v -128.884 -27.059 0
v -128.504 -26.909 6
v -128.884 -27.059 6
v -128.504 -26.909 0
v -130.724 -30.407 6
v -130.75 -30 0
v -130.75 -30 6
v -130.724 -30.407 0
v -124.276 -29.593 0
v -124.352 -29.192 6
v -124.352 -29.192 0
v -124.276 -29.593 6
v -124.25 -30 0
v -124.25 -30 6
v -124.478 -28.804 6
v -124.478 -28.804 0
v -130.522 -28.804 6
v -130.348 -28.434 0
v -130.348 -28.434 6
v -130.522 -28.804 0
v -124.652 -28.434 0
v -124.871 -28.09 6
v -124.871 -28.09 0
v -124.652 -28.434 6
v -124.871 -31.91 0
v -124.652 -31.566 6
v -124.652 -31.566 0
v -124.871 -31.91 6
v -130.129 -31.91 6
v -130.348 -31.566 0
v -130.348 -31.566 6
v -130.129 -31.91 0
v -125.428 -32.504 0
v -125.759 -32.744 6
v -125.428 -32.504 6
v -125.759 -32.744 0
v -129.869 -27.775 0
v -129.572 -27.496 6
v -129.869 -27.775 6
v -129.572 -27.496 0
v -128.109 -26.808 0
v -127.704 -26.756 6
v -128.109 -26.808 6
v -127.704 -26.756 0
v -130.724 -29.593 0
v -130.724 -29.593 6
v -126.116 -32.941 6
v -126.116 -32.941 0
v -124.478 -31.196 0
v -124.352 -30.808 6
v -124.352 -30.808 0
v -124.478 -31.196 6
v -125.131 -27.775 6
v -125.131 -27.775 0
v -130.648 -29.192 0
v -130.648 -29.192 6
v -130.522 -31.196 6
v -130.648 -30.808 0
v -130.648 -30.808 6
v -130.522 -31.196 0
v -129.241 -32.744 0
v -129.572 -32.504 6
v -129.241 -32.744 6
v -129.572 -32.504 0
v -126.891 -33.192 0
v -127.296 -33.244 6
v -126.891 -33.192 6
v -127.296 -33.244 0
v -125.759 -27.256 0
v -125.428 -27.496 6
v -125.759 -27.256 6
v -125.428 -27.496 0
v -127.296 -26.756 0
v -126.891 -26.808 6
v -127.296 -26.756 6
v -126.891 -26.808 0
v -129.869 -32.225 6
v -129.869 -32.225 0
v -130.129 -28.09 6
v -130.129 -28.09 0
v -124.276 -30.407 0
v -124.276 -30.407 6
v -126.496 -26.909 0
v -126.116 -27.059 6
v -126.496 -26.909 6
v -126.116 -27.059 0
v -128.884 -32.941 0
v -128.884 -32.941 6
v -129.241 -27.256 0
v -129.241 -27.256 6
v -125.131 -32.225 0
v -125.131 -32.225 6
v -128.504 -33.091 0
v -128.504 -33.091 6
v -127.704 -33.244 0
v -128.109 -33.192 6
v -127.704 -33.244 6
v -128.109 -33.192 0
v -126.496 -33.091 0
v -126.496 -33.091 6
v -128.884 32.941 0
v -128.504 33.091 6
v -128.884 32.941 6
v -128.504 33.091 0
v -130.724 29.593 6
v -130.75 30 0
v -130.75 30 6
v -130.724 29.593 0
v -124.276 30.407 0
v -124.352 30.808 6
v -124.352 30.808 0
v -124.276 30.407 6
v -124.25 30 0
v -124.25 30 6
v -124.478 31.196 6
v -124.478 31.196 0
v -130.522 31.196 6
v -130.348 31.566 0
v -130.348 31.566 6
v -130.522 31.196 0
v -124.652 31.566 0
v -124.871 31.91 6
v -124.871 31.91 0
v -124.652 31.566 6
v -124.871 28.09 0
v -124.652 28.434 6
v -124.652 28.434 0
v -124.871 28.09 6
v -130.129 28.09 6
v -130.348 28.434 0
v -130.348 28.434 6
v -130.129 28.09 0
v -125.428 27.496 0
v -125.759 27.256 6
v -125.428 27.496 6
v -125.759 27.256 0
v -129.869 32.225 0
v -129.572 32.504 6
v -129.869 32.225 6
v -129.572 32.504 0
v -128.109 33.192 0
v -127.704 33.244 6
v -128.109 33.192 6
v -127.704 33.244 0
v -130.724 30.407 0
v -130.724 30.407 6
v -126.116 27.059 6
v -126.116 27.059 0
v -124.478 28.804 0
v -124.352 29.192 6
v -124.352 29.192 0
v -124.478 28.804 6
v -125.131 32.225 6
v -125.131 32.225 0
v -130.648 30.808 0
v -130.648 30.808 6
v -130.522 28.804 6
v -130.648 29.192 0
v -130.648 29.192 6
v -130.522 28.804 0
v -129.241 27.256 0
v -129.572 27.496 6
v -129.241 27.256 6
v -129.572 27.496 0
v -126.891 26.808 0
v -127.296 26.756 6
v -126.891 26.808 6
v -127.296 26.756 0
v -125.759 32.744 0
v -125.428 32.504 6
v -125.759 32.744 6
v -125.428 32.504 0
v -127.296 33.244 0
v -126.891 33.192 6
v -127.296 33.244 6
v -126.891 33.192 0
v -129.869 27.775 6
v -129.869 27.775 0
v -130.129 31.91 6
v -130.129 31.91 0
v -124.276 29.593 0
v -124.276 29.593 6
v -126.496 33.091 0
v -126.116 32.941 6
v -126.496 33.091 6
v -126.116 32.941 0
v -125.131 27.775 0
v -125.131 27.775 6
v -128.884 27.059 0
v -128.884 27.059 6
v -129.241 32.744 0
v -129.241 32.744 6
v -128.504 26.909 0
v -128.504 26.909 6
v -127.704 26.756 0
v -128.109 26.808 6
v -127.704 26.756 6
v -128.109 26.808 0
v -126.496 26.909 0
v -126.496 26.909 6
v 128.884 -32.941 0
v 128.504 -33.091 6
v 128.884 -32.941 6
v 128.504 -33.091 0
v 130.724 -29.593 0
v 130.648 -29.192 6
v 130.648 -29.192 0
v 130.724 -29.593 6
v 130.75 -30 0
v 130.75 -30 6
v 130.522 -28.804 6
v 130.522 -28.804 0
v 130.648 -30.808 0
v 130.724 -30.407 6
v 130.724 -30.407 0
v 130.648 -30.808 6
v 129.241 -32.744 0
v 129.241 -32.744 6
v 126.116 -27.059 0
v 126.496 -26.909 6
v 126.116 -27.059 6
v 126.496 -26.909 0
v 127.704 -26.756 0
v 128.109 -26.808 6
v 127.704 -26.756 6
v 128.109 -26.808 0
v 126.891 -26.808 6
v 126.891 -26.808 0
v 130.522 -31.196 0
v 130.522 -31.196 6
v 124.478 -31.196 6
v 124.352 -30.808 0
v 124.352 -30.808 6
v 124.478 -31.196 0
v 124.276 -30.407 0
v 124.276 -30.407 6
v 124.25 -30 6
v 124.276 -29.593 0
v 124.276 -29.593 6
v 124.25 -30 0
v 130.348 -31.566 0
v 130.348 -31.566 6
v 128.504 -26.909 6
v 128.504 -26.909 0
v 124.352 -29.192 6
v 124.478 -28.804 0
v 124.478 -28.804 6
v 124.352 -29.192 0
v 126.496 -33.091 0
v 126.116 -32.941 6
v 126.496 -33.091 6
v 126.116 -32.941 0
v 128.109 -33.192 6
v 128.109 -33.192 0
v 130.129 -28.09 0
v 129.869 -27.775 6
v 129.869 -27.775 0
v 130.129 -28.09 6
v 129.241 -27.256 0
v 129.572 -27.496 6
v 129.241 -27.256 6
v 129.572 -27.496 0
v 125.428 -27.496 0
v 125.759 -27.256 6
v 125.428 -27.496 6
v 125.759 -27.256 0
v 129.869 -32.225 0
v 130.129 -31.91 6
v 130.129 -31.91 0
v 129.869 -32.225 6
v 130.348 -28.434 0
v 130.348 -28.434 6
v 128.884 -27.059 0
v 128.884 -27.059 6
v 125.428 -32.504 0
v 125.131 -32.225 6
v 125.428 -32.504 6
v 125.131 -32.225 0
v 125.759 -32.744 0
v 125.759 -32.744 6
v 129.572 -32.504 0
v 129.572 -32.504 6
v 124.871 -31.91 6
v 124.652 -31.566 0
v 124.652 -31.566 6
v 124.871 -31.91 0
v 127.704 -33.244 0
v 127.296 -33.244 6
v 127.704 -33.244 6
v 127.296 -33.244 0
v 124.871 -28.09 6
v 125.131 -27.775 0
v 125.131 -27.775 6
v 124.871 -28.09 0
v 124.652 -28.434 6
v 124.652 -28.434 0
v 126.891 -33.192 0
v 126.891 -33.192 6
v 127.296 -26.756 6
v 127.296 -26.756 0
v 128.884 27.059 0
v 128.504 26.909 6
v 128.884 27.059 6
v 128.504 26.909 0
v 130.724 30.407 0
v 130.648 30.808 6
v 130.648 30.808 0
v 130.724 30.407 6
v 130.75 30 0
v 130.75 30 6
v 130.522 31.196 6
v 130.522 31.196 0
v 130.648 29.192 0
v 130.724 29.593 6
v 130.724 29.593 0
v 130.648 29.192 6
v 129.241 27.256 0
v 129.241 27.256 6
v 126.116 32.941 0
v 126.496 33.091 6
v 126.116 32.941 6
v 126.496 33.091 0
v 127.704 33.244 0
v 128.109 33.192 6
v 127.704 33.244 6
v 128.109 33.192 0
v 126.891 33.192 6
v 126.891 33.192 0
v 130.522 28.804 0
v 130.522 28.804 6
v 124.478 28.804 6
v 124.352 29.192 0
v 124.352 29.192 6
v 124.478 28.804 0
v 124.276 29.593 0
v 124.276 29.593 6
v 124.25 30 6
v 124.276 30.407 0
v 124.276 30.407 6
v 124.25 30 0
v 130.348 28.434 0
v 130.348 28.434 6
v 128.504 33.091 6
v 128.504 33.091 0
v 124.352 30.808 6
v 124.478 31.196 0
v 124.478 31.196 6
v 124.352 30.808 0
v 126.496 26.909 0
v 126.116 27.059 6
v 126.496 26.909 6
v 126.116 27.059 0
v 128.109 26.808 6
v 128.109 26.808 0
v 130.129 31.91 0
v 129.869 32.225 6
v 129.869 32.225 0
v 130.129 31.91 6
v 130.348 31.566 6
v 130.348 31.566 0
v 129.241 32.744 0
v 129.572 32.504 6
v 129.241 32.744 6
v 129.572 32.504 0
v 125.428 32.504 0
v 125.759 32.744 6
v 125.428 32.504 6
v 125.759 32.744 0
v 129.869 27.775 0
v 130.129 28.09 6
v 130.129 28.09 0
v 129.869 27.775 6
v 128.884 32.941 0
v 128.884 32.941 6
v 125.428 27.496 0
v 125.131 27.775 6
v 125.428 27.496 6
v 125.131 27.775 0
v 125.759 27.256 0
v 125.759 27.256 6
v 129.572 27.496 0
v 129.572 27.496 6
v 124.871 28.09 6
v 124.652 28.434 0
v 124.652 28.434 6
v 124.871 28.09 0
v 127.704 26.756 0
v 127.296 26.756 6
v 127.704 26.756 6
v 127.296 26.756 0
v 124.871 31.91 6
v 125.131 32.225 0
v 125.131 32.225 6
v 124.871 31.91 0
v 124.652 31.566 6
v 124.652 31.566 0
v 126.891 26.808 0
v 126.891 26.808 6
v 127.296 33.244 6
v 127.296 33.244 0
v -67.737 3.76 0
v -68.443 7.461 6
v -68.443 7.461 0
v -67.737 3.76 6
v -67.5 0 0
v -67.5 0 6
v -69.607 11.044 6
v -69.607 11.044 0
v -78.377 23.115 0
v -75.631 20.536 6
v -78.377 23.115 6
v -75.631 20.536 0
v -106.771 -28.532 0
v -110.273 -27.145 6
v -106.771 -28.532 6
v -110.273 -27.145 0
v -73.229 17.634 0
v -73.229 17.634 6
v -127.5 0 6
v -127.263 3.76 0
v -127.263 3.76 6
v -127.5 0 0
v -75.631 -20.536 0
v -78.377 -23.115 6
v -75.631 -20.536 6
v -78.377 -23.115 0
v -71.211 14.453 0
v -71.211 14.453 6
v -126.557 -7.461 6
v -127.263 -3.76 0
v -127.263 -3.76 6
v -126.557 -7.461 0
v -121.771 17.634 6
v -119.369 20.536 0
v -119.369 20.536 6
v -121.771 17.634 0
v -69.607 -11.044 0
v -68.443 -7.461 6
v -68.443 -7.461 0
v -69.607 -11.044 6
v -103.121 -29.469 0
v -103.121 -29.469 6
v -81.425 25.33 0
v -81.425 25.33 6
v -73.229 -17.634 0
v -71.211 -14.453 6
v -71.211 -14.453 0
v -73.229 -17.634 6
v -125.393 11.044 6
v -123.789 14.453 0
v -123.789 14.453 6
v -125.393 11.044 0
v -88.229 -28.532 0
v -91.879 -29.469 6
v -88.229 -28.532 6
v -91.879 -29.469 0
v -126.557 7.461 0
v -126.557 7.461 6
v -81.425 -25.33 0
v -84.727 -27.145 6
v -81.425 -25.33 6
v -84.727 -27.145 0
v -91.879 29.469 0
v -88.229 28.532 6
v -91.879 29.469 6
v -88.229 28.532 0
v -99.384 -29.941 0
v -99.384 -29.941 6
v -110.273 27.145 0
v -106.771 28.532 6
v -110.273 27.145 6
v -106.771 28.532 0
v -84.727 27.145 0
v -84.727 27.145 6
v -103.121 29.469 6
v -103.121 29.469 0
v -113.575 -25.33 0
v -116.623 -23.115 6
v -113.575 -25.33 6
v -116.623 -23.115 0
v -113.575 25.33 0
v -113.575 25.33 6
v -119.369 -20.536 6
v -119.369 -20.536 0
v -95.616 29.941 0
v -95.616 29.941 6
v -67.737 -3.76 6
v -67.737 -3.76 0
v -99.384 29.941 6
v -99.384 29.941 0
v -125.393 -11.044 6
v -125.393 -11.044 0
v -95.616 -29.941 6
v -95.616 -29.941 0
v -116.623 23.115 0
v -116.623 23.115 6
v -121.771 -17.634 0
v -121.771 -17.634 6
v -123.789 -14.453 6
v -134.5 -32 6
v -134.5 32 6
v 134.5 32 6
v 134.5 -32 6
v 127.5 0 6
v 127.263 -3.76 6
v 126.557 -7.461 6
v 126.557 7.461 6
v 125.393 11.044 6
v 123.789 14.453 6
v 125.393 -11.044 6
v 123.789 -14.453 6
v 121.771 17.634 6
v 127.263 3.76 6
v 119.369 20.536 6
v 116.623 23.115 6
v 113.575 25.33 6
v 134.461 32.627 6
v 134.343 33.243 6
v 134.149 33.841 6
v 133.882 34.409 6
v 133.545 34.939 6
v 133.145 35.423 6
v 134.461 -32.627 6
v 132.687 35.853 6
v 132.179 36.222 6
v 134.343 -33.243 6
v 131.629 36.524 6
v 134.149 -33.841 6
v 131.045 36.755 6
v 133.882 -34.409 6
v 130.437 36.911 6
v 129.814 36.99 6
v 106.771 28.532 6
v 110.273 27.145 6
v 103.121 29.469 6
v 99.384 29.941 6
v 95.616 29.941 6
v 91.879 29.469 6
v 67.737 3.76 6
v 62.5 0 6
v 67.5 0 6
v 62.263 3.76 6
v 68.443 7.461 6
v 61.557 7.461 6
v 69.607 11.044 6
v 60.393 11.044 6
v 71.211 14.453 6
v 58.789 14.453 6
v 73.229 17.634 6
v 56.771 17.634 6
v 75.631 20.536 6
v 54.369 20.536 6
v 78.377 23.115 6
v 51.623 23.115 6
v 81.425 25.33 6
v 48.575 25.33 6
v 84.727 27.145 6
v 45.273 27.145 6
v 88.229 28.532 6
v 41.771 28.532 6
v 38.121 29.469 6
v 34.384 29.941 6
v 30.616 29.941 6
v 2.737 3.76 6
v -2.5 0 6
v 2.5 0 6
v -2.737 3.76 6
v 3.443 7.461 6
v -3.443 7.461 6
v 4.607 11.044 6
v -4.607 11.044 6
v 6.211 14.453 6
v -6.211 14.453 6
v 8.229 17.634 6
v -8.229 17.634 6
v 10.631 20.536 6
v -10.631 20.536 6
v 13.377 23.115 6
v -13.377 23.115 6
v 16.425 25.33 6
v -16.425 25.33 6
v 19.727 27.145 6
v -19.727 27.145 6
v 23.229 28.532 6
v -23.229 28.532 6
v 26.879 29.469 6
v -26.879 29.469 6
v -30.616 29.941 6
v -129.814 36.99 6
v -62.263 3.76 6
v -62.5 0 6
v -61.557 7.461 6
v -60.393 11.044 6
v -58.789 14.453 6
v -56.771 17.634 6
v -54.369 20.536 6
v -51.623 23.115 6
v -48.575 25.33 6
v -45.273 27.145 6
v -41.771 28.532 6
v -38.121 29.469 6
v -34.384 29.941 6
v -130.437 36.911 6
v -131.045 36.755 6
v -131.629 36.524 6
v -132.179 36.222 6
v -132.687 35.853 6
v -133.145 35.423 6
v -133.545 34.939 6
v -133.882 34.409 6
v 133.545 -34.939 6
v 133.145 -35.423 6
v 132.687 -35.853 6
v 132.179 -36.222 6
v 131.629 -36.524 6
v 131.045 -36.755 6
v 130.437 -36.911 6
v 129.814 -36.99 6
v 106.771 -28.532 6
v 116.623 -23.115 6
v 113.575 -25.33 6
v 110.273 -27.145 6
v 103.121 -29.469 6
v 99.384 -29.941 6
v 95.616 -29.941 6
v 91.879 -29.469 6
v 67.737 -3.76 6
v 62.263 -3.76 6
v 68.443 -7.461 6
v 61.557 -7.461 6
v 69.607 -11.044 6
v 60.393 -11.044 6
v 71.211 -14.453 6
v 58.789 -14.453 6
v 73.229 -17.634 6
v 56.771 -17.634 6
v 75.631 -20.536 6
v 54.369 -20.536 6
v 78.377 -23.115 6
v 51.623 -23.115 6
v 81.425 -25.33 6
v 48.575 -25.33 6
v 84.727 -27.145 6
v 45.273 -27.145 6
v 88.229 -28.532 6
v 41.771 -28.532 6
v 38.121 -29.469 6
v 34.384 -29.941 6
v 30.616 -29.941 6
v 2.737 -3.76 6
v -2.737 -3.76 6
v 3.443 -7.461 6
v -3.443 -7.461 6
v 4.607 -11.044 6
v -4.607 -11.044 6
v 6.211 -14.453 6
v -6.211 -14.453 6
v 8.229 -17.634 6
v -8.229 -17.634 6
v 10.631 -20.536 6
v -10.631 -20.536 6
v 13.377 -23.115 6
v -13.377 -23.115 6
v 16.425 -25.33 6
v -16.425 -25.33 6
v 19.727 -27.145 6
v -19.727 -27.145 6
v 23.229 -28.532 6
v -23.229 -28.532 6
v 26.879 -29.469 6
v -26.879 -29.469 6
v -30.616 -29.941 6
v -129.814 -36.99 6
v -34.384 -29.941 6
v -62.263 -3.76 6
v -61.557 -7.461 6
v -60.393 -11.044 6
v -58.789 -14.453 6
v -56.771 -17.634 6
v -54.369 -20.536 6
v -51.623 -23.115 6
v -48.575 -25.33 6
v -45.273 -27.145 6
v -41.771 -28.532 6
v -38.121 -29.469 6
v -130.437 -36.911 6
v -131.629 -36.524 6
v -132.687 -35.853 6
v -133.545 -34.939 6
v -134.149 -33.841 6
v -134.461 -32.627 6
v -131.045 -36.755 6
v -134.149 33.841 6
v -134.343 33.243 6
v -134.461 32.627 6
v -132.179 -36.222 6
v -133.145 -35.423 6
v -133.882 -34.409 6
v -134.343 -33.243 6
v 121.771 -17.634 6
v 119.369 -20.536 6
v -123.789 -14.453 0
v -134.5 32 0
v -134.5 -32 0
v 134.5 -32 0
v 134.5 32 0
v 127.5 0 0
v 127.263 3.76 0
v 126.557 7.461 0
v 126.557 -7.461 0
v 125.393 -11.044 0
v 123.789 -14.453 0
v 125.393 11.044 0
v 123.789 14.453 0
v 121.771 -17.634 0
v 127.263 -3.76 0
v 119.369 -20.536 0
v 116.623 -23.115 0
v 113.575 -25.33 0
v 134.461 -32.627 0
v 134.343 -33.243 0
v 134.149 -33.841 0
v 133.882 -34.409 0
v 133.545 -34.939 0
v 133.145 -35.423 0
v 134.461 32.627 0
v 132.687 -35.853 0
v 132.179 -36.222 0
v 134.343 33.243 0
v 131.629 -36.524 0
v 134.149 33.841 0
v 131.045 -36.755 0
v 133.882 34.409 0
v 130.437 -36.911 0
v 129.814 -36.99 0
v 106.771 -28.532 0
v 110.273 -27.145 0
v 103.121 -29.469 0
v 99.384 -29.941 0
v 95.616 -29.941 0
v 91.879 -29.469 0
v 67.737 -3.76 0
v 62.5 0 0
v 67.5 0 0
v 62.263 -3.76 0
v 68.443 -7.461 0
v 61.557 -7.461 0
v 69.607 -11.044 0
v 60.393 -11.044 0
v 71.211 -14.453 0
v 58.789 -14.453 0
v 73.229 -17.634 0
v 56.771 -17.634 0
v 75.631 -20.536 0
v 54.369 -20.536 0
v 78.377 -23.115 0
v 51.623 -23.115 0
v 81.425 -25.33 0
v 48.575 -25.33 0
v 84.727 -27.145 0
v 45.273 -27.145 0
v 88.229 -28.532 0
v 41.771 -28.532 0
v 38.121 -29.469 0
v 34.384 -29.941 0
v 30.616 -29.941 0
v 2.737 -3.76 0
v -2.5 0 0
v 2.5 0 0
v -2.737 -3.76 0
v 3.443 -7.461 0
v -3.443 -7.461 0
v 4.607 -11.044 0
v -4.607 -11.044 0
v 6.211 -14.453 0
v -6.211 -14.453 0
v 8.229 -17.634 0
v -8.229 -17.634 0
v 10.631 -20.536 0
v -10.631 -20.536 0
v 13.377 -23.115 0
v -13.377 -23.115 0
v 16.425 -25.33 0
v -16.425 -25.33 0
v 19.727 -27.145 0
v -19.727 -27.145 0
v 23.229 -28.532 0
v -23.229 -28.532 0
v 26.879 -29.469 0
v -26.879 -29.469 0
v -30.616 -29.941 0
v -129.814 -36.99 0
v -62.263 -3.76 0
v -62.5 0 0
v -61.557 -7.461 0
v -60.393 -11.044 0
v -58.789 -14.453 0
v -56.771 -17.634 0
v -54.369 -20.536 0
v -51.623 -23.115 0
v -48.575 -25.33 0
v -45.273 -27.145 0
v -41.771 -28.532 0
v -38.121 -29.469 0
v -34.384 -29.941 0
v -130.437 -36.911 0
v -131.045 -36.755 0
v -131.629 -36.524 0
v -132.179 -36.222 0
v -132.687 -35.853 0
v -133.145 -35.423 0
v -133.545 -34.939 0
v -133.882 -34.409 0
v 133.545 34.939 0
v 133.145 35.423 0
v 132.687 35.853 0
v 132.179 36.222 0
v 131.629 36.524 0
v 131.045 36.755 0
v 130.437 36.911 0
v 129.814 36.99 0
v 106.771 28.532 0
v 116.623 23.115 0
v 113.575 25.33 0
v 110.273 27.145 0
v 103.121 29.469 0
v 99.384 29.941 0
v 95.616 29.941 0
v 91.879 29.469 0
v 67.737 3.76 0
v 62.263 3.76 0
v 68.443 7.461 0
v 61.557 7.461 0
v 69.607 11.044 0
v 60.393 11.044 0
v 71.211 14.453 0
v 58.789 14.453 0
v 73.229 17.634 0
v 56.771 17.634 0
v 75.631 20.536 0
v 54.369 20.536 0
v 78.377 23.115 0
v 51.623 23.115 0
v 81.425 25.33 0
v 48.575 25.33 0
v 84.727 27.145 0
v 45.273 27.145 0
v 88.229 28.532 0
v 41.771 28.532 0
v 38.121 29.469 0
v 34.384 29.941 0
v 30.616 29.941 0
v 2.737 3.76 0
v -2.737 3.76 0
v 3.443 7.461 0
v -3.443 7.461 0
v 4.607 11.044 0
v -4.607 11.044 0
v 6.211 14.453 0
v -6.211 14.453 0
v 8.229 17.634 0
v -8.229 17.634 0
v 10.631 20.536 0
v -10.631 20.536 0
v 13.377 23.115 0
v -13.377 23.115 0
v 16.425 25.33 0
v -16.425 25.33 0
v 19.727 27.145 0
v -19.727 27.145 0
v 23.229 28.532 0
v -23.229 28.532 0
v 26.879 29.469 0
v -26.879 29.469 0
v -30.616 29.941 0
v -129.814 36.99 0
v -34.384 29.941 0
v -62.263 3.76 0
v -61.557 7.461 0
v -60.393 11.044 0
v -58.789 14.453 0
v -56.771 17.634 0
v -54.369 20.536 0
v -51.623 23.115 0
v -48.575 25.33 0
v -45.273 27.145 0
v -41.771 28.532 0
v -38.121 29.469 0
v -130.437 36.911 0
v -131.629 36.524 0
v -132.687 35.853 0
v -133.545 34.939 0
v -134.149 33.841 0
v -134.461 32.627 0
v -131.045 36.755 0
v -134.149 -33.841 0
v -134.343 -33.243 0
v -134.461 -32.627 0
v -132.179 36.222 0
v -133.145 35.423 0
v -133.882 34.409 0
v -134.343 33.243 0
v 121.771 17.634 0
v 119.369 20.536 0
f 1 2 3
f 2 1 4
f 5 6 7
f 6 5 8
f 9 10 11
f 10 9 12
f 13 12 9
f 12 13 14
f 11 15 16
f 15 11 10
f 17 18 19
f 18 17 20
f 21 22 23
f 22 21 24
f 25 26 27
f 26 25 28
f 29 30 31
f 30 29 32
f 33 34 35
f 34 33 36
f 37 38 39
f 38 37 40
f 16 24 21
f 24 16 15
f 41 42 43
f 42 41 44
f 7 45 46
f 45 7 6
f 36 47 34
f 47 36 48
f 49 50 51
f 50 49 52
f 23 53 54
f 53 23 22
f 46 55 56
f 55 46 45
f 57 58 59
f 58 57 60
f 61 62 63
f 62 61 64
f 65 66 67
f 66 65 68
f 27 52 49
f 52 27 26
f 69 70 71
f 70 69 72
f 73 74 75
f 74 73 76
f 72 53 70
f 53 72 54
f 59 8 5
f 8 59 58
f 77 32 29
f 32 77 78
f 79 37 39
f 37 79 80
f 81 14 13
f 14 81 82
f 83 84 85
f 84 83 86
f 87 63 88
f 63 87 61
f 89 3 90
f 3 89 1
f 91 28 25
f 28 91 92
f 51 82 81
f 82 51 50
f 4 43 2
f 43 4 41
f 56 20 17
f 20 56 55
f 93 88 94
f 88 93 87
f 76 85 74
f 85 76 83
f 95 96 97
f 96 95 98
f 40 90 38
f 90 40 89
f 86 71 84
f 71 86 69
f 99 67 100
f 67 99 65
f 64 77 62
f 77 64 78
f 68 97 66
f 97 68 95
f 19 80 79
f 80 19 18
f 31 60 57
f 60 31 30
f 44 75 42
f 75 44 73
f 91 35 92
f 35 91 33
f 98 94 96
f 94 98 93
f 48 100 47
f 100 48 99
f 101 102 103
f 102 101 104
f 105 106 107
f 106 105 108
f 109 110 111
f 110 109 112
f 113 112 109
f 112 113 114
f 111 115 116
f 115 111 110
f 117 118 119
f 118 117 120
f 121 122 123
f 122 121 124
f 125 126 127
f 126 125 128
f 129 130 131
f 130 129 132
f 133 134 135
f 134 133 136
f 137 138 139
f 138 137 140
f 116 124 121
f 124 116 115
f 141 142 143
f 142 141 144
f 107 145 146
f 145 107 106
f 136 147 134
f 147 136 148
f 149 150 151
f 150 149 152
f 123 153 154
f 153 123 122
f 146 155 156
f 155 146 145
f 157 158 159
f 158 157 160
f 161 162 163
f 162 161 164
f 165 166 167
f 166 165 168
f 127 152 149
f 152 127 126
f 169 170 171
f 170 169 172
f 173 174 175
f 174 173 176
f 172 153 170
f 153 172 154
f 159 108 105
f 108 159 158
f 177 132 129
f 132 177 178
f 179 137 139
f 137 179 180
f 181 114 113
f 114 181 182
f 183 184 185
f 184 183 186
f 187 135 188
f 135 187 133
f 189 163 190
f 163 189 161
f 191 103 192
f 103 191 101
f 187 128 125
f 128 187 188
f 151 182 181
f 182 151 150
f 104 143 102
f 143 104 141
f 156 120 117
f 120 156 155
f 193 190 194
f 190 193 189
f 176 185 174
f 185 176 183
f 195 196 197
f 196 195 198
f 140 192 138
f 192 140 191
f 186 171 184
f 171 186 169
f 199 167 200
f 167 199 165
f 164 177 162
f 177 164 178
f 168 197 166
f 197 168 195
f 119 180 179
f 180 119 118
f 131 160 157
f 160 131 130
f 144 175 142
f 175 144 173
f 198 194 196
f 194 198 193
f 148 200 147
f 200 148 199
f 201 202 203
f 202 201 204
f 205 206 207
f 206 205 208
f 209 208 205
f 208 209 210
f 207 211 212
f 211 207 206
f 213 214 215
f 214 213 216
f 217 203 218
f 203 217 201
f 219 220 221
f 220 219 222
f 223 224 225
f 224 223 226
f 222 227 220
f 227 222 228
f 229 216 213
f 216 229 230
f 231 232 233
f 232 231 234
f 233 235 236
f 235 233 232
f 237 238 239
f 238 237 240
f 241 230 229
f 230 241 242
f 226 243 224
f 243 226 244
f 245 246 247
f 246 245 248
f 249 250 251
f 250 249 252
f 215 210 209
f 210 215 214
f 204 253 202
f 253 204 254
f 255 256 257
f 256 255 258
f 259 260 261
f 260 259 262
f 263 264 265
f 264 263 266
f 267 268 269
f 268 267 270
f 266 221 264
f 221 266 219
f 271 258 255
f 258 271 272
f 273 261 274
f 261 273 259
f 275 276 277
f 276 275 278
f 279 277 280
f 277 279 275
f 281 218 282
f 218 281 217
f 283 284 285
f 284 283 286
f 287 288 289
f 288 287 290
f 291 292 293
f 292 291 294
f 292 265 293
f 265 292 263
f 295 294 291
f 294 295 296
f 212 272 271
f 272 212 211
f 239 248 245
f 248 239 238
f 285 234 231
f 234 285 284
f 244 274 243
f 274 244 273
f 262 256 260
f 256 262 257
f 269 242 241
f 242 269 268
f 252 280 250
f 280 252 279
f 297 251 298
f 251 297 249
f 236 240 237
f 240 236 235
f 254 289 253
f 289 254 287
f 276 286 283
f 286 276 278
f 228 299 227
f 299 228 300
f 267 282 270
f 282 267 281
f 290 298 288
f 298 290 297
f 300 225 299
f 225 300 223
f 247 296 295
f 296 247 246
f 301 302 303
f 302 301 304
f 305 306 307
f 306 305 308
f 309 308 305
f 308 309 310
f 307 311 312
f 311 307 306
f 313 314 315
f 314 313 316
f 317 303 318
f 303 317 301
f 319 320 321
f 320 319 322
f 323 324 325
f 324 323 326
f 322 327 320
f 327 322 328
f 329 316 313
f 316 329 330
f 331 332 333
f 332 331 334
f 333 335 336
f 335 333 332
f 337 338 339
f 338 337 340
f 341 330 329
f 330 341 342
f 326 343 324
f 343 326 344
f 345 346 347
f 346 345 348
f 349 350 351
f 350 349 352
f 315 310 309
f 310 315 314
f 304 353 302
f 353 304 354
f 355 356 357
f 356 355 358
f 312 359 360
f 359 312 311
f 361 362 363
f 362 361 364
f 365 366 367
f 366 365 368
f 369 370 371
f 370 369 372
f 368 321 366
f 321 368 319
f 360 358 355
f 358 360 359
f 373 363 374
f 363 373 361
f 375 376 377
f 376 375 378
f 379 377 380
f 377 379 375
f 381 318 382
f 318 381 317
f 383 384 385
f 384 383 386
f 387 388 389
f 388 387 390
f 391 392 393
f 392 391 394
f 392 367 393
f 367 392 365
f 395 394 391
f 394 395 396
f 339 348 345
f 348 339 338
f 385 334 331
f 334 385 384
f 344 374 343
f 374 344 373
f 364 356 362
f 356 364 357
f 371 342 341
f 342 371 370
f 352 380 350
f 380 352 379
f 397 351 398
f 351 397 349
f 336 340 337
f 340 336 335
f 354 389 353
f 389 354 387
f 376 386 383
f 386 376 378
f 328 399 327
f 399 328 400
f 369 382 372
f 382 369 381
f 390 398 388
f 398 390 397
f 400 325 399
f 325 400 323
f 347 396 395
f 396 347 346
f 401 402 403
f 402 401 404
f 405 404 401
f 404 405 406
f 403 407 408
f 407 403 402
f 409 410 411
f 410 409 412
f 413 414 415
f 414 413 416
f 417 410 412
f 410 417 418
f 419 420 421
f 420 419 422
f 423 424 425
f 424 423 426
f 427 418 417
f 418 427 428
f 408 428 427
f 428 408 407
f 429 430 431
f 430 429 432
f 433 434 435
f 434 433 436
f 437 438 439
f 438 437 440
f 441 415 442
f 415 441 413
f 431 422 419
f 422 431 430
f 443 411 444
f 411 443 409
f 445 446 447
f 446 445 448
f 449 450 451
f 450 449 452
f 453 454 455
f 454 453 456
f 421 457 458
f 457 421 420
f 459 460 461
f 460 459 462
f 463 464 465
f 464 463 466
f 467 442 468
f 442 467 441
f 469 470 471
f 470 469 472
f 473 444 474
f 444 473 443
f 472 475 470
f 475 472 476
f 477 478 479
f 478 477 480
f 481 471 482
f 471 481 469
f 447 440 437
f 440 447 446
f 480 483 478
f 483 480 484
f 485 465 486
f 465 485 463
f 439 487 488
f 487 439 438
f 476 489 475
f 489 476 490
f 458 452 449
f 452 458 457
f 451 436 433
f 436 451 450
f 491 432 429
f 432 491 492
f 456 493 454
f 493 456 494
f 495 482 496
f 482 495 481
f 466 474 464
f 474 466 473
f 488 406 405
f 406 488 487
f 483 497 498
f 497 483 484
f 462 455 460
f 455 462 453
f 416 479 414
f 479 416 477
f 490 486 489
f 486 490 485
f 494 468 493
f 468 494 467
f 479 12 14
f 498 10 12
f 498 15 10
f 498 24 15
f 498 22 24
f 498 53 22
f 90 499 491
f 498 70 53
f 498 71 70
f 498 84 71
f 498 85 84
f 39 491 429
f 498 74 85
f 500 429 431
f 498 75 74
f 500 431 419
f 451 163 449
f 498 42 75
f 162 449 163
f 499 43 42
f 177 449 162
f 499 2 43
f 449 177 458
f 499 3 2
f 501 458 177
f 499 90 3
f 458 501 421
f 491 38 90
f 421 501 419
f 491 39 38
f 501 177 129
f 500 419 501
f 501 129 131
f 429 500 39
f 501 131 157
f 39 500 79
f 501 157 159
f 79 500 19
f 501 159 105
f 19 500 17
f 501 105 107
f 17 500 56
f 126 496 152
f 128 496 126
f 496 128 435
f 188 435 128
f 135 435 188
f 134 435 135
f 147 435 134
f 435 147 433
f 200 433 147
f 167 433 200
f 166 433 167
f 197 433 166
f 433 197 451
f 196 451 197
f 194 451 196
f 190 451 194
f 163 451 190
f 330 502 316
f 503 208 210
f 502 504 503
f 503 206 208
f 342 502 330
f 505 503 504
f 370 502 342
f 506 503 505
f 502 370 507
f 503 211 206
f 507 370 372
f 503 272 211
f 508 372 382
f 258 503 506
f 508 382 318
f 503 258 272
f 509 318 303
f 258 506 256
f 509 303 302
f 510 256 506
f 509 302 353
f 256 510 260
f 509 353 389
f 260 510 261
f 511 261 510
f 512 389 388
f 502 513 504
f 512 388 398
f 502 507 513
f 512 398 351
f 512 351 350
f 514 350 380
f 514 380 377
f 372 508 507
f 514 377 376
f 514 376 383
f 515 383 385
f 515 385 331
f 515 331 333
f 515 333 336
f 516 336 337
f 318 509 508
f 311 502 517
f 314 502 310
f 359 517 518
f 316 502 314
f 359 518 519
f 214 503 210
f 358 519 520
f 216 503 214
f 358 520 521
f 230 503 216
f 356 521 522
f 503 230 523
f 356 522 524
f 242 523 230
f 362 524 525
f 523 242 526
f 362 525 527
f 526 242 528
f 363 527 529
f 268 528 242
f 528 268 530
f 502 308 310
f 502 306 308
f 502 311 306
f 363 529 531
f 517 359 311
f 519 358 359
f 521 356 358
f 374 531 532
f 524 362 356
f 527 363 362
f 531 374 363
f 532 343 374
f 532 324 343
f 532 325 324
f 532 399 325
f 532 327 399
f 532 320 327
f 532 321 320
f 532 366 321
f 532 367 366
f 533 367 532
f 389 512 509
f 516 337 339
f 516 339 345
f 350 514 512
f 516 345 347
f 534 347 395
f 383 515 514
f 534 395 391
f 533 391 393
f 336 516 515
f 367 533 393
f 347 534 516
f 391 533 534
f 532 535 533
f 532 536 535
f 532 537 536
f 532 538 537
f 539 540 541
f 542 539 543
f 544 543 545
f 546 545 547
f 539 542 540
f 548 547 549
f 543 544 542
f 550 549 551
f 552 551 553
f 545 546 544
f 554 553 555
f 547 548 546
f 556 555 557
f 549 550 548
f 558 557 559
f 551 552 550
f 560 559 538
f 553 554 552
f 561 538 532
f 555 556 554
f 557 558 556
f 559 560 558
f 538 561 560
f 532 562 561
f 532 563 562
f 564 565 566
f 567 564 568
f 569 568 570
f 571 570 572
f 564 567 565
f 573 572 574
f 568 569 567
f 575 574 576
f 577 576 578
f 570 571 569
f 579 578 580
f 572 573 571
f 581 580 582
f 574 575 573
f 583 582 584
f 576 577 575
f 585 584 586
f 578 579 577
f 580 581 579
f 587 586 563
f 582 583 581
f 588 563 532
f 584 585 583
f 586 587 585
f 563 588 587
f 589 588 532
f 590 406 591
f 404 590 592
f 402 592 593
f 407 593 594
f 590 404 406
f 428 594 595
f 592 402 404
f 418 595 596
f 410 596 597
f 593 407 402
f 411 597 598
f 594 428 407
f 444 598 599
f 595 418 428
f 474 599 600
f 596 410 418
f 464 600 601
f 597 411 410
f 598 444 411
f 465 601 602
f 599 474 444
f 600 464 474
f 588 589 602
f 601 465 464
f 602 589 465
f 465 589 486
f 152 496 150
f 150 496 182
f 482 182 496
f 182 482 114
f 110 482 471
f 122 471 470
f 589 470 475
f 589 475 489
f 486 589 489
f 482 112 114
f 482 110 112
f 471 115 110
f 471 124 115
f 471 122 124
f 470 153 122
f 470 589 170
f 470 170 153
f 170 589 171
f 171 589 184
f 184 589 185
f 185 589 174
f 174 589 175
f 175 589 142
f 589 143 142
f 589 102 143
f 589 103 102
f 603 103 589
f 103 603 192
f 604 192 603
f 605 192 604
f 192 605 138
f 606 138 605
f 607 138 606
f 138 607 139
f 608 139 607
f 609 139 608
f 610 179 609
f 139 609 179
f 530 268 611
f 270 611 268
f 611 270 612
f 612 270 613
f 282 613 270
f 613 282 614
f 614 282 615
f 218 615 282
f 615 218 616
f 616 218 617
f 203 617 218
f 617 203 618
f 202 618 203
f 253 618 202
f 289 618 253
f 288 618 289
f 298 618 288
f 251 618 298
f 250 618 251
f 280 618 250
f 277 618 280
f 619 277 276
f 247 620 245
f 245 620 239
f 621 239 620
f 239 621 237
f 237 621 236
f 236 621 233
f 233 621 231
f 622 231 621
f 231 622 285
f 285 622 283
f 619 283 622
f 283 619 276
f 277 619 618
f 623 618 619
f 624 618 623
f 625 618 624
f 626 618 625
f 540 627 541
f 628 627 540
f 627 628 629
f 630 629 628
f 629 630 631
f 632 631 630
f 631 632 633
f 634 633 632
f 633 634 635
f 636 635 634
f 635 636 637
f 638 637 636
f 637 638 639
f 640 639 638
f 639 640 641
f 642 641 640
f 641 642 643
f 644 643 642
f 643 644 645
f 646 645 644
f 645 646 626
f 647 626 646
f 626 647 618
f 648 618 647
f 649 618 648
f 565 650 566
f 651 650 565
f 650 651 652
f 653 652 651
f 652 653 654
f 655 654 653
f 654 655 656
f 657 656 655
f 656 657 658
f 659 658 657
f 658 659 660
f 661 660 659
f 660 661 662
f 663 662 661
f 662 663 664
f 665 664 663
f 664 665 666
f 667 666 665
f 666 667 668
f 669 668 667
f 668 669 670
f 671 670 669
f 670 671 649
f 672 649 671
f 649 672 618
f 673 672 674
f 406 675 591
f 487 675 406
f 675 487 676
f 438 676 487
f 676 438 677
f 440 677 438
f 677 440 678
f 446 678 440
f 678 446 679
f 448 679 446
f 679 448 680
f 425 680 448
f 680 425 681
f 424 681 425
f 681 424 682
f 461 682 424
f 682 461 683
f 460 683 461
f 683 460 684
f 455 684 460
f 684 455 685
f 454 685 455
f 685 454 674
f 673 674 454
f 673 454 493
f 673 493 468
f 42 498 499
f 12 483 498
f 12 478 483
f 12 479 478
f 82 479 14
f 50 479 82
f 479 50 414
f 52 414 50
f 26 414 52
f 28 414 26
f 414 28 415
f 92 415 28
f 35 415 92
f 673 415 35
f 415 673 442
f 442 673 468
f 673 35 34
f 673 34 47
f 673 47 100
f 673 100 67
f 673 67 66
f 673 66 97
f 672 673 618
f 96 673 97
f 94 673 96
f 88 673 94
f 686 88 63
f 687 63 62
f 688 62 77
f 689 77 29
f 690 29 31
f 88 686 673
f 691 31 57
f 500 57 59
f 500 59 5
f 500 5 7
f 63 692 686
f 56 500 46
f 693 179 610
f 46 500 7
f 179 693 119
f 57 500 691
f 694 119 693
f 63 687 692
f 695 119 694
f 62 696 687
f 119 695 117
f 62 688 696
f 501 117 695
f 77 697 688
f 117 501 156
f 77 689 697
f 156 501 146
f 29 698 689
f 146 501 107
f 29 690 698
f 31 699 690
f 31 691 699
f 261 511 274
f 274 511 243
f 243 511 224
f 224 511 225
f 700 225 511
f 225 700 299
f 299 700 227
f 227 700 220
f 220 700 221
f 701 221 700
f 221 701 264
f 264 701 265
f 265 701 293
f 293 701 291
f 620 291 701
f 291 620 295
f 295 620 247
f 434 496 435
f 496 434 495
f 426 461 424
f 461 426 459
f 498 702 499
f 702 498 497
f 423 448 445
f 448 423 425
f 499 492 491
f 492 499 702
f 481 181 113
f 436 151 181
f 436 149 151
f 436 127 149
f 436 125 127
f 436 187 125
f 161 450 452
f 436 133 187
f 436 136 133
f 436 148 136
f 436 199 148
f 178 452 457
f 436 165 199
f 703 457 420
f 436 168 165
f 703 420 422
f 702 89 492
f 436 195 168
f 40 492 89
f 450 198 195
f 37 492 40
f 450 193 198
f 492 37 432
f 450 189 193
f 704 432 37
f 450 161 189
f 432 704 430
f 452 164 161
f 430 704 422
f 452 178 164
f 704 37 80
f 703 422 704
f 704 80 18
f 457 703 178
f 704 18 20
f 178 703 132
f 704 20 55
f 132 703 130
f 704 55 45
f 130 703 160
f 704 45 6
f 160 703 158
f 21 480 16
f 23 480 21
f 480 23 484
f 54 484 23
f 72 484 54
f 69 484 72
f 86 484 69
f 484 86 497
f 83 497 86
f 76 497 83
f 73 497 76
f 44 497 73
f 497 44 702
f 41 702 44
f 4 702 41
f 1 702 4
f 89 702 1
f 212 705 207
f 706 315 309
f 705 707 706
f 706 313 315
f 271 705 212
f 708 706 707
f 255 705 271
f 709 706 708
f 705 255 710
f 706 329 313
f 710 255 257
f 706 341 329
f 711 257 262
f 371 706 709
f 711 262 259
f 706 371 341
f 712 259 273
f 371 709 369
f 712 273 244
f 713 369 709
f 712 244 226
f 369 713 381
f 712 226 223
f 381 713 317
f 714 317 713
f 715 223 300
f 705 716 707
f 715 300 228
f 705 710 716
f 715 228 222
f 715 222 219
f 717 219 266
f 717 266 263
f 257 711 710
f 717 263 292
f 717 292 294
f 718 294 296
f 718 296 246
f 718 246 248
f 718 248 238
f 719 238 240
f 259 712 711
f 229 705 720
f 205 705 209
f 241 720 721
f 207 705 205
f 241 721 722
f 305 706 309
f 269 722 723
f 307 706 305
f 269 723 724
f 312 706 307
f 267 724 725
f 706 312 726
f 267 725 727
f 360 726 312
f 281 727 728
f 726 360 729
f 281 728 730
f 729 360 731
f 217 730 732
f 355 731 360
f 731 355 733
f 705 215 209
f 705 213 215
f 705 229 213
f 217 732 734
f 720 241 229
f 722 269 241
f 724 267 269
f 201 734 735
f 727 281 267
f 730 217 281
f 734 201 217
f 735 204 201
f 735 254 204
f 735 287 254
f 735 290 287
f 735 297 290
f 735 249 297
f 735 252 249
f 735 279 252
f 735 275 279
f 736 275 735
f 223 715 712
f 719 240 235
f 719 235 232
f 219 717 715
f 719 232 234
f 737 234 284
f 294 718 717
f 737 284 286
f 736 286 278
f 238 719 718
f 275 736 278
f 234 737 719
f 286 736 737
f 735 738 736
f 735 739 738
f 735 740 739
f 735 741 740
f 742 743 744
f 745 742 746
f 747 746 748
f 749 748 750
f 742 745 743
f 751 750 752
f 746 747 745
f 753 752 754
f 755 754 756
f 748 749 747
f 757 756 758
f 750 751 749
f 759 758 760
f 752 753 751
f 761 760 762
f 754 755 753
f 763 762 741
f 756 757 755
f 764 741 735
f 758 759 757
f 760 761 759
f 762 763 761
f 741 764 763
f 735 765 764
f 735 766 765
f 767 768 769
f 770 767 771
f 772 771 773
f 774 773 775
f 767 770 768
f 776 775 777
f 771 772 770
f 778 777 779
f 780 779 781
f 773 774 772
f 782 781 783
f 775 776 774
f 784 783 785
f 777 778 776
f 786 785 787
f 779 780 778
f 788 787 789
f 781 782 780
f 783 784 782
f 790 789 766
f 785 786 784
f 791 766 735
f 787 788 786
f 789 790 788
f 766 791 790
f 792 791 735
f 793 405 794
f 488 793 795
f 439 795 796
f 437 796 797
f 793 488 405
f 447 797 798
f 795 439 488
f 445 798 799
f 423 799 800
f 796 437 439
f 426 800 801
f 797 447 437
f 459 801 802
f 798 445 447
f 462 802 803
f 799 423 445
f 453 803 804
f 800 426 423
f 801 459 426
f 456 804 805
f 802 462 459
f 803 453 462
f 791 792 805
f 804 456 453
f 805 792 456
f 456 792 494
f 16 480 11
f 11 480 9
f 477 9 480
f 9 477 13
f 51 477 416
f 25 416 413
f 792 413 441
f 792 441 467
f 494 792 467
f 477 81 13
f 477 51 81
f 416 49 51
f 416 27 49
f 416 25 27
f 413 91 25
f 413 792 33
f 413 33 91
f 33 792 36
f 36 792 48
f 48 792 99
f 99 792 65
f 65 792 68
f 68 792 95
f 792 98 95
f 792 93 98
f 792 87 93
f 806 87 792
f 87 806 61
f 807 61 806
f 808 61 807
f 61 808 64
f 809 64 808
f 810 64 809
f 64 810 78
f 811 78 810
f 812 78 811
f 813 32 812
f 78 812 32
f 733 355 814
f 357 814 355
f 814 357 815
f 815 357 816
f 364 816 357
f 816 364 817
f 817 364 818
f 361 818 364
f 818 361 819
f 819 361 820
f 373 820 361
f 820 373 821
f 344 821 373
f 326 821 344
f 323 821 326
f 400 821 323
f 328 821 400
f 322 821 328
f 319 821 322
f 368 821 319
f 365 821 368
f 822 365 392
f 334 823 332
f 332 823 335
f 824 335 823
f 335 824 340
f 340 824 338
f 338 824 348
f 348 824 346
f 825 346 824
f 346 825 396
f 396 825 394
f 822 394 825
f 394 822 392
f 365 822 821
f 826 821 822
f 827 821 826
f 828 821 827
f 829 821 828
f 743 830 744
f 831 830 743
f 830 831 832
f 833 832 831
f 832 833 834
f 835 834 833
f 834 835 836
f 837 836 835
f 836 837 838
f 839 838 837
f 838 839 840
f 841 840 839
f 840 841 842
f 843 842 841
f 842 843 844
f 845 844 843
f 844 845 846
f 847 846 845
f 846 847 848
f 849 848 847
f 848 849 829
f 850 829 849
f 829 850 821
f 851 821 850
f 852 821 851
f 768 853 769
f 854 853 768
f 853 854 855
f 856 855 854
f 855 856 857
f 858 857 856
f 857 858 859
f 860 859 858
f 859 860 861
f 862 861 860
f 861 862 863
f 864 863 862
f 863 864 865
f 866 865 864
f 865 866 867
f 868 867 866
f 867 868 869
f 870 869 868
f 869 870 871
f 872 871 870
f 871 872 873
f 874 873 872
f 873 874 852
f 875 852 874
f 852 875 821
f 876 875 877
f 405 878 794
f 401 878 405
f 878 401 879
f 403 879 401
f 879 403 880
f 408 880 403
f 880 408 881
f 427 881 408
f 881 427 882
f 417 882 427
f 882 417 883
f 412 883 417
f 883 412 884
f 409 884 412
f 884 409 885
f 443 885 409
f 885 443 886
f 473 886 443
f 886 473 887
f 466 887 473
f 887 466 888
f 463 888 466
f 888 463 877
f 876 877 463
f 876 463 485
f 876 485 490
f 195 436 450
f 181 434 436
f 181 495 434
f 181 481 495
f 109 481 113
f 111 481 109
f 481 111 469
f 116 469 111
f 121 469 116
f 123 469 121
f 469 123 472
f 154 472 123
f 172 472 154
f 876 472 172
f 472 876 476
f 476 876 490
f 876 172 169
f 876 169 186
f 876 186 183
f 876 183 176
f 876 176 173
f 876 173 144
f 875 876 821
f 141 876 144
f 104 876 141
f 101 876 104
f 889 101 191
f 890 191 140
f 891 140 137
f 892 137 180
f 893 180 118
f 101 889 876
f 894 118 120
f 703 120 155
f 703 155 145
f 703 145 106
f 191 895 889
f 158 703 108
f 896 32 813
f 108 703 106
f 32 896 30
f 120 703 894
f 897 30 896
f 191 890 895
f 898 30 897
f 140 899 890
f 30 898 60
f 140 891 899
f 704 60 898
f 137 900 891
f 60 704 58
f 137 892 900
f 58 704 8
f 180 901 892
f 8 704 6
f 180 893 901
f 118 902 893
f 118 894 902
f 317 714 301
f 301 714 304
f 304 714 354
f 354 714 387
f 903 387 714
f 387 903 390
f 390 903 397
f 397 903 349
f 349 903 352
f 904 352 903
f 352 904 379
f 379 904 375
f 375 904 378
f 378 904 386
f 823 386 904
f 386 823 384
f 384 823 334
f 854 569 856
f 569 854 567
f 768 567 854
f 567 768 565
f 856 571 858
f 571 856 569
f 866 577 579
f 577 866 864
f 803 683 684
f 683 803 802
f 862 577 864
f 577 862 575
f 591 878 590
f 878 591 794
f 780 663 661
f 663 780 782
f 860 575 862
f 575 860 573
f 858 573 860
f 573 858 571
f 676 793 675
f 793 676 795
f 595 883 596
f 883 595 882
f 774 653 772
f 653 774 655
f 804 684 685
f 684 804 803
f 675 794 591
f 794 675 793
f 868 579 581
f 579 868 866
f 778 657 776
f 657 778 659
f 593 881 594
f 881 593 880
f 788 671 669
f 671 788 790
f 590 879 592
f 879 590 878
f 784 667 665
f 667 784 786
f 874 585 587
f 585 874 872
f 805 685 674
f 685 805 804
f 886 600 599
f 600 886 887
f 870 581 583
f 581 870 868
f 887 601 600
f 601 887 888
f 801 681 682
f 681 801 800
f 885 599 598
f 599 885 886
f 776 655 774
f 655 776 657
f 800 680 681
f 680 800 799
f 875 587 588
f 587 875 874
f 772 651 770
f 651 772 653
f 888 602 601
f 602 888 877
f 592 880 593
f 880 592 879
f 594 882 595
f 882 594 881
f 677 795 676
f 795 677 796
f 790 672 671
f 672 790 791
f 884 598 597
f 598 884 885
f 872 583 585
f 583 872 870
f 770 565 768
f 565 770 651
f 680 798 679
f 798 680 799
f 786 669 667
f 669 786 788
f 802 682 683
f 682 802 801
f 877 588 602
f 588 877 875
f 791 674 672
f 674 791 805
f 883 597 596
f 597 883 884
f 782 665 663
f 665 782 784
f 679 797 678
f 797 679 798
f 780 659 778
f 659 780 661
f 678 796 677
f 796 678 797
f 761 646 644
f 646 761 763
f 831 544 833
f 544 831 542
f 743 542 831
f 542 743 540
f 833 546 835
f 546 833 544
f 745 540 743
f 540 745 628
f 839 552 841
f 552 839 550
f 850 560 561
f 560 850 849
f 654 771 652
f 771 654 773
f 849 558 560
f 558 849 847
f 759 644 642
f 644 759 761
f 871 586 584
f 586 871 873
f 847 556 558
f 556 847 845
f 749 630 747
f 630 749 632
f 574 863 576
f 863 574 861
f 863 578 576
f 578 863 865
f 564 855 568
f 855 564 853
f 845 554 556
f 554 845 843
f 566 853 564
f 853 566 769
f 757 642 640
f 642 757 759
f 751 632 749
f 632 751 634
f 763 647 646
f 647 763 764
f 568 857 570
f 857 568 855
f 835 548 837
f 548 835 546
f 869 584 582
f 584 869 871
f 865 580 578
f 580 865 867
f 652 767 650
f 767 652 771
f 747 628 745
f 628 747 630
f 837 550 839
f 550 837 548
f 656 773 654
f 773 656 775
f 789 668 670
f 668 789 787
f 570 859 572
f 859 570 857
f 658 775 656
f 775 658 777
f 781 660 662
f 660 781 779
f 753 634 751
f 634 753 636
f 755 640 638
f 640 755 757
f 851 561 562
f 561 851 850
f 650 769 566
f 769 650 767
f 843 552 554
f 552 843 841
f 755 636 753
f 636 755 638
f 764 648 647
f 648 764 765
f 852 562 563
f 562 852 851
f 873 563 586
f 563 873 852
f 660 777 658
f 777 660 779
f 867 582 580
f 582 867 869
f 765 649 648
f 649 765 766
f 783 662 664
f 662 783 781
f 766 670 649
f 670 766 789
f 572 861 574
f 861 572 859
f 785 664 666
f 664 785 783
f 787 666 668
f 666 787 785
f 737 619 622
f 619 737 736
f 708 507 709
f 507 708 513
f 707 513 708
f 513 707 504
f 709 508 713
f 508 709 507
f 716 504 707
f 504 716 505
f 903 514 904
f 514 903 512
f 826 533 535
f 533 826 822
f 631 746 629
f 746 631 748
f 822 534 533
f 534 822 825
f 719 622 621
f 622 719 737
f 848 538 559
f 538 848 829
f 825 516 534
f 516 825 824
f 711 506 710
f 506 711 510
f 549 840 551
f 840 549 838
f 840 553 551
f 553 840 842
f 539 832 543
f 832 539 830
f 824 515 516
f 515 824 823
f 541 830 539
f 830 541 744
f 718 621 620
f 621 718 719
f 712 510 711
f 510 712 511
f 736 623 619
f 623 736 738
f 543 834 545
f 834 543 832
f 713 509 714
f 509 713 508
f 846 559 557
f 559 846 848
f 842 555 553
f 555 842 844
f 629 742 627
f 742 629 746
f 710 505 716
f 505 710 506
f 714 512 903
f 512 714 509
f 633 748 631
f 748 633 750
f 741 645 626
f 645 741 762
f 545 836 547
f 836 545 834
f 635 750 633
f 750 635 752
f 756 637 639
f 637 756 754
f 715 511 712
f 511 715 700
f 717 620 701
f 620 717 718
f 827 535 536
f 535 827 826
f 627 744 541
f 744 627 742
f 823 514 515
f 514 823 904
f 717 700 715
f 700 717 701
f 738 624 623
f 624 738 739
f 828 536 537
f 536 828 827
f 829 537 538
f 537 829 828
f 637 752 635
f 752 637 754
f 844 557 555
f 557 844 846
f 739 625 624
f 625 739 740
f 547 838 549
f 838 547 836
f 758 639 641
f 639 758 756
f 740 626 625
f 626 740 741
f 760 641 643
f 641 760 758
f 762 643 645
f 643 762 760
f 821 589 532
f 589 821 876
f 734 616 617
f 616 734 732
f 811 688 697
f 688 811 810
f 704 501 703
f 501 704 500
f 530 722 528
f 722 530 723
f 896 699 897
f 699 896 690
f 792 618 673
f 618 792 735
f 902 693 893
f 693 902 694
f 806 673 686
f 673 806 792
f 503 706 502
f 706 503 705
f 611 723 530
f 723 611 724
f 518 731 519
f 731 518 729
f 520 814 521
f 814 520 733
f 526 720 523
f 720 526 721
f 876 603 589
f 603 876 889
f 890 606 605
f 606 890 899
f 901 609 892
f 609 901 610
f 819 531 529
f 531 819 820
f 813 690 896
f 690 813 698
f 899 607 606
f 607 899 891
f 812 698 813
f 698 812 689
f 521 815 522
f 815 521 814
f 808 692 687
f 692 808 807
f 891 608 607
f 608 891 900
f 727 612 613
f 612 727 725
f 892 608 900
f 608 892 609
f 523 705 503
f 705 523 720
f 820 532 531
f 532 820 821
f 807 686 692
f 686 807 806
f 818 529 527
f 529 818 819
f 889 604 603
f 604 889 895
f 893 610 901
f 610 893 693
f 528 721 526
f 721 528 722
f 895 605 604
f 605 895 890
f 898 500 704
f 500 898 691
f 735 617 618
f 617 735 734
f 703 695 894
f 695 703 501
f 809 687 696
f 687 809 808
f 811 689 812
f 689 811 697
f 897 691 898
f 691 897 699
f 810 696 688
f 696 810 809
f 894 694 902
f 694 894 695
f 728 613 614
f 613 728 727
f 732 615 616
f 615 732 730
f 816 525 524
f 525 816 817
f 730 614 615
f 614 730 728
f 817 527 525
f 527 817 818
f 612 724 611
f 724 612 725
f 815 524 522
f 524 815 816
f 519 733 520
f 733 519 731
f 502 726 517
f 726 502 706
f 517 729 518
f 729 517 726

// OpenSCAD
$fn = 50;


difference() {
	union() {
		hull() {
			translate(v = [-129.5000000000, 32.0000000000, 0]) {
				cylinder(h = 6, r = 5);
			}
			translate(v = [129.5000000000, 32.0000000000, 0]) {
				cylinder(h = 6, r = 5);
			}
			translate(v = [-129.5000000000, -32.0000000000, 0]) {
				cylinder(h = 6, r = 5);
			}
			translate(v = [129.5000000000, -32.0000000000, 0]) {
				cylinder(h = 6, r = 5);
			}
		}
	}
	union() {
		#translate(v = [-127.5000000000, -30.0000000000, -100.0000000000]) {
			cylinder(h = 200, r = 3.2500000000);
		}
		#translate(v = [-127.5000000000, 30.0000000000, -100.0000000000]) {
			cylinder(h = 200, r = 3.2500000000);
		}
		#translate(v = [127.5000000000, -30.0000000000, -100.0000000000]) {
			cylinder(h = 200, r = 3.2500000000);
		}
		#translate(v = [127.5000000000, 30.0000000000, -100.0000000000]) {
			cylinder(h = 200, r = 3.2500000000);
		}
		#translate(v = [-97.5000000000, 0, 0]) {
			cylinder(h = 6, r = 30.0000000000);
		}
		#translate(v = [-32.5000000000, 0, 0]) {
			cylinder(h = 6, r = 30.0000000000);
		}
		#translate(v = [32.5000000000, 0, 0]) {
			cylinder(h = 6, r = 30.0000000000);
		}
		#translate(v = [97.5000000000, 0, 0]) {
			cylinder(h = 6, r = 30.0000000000);
		}
	}
}
